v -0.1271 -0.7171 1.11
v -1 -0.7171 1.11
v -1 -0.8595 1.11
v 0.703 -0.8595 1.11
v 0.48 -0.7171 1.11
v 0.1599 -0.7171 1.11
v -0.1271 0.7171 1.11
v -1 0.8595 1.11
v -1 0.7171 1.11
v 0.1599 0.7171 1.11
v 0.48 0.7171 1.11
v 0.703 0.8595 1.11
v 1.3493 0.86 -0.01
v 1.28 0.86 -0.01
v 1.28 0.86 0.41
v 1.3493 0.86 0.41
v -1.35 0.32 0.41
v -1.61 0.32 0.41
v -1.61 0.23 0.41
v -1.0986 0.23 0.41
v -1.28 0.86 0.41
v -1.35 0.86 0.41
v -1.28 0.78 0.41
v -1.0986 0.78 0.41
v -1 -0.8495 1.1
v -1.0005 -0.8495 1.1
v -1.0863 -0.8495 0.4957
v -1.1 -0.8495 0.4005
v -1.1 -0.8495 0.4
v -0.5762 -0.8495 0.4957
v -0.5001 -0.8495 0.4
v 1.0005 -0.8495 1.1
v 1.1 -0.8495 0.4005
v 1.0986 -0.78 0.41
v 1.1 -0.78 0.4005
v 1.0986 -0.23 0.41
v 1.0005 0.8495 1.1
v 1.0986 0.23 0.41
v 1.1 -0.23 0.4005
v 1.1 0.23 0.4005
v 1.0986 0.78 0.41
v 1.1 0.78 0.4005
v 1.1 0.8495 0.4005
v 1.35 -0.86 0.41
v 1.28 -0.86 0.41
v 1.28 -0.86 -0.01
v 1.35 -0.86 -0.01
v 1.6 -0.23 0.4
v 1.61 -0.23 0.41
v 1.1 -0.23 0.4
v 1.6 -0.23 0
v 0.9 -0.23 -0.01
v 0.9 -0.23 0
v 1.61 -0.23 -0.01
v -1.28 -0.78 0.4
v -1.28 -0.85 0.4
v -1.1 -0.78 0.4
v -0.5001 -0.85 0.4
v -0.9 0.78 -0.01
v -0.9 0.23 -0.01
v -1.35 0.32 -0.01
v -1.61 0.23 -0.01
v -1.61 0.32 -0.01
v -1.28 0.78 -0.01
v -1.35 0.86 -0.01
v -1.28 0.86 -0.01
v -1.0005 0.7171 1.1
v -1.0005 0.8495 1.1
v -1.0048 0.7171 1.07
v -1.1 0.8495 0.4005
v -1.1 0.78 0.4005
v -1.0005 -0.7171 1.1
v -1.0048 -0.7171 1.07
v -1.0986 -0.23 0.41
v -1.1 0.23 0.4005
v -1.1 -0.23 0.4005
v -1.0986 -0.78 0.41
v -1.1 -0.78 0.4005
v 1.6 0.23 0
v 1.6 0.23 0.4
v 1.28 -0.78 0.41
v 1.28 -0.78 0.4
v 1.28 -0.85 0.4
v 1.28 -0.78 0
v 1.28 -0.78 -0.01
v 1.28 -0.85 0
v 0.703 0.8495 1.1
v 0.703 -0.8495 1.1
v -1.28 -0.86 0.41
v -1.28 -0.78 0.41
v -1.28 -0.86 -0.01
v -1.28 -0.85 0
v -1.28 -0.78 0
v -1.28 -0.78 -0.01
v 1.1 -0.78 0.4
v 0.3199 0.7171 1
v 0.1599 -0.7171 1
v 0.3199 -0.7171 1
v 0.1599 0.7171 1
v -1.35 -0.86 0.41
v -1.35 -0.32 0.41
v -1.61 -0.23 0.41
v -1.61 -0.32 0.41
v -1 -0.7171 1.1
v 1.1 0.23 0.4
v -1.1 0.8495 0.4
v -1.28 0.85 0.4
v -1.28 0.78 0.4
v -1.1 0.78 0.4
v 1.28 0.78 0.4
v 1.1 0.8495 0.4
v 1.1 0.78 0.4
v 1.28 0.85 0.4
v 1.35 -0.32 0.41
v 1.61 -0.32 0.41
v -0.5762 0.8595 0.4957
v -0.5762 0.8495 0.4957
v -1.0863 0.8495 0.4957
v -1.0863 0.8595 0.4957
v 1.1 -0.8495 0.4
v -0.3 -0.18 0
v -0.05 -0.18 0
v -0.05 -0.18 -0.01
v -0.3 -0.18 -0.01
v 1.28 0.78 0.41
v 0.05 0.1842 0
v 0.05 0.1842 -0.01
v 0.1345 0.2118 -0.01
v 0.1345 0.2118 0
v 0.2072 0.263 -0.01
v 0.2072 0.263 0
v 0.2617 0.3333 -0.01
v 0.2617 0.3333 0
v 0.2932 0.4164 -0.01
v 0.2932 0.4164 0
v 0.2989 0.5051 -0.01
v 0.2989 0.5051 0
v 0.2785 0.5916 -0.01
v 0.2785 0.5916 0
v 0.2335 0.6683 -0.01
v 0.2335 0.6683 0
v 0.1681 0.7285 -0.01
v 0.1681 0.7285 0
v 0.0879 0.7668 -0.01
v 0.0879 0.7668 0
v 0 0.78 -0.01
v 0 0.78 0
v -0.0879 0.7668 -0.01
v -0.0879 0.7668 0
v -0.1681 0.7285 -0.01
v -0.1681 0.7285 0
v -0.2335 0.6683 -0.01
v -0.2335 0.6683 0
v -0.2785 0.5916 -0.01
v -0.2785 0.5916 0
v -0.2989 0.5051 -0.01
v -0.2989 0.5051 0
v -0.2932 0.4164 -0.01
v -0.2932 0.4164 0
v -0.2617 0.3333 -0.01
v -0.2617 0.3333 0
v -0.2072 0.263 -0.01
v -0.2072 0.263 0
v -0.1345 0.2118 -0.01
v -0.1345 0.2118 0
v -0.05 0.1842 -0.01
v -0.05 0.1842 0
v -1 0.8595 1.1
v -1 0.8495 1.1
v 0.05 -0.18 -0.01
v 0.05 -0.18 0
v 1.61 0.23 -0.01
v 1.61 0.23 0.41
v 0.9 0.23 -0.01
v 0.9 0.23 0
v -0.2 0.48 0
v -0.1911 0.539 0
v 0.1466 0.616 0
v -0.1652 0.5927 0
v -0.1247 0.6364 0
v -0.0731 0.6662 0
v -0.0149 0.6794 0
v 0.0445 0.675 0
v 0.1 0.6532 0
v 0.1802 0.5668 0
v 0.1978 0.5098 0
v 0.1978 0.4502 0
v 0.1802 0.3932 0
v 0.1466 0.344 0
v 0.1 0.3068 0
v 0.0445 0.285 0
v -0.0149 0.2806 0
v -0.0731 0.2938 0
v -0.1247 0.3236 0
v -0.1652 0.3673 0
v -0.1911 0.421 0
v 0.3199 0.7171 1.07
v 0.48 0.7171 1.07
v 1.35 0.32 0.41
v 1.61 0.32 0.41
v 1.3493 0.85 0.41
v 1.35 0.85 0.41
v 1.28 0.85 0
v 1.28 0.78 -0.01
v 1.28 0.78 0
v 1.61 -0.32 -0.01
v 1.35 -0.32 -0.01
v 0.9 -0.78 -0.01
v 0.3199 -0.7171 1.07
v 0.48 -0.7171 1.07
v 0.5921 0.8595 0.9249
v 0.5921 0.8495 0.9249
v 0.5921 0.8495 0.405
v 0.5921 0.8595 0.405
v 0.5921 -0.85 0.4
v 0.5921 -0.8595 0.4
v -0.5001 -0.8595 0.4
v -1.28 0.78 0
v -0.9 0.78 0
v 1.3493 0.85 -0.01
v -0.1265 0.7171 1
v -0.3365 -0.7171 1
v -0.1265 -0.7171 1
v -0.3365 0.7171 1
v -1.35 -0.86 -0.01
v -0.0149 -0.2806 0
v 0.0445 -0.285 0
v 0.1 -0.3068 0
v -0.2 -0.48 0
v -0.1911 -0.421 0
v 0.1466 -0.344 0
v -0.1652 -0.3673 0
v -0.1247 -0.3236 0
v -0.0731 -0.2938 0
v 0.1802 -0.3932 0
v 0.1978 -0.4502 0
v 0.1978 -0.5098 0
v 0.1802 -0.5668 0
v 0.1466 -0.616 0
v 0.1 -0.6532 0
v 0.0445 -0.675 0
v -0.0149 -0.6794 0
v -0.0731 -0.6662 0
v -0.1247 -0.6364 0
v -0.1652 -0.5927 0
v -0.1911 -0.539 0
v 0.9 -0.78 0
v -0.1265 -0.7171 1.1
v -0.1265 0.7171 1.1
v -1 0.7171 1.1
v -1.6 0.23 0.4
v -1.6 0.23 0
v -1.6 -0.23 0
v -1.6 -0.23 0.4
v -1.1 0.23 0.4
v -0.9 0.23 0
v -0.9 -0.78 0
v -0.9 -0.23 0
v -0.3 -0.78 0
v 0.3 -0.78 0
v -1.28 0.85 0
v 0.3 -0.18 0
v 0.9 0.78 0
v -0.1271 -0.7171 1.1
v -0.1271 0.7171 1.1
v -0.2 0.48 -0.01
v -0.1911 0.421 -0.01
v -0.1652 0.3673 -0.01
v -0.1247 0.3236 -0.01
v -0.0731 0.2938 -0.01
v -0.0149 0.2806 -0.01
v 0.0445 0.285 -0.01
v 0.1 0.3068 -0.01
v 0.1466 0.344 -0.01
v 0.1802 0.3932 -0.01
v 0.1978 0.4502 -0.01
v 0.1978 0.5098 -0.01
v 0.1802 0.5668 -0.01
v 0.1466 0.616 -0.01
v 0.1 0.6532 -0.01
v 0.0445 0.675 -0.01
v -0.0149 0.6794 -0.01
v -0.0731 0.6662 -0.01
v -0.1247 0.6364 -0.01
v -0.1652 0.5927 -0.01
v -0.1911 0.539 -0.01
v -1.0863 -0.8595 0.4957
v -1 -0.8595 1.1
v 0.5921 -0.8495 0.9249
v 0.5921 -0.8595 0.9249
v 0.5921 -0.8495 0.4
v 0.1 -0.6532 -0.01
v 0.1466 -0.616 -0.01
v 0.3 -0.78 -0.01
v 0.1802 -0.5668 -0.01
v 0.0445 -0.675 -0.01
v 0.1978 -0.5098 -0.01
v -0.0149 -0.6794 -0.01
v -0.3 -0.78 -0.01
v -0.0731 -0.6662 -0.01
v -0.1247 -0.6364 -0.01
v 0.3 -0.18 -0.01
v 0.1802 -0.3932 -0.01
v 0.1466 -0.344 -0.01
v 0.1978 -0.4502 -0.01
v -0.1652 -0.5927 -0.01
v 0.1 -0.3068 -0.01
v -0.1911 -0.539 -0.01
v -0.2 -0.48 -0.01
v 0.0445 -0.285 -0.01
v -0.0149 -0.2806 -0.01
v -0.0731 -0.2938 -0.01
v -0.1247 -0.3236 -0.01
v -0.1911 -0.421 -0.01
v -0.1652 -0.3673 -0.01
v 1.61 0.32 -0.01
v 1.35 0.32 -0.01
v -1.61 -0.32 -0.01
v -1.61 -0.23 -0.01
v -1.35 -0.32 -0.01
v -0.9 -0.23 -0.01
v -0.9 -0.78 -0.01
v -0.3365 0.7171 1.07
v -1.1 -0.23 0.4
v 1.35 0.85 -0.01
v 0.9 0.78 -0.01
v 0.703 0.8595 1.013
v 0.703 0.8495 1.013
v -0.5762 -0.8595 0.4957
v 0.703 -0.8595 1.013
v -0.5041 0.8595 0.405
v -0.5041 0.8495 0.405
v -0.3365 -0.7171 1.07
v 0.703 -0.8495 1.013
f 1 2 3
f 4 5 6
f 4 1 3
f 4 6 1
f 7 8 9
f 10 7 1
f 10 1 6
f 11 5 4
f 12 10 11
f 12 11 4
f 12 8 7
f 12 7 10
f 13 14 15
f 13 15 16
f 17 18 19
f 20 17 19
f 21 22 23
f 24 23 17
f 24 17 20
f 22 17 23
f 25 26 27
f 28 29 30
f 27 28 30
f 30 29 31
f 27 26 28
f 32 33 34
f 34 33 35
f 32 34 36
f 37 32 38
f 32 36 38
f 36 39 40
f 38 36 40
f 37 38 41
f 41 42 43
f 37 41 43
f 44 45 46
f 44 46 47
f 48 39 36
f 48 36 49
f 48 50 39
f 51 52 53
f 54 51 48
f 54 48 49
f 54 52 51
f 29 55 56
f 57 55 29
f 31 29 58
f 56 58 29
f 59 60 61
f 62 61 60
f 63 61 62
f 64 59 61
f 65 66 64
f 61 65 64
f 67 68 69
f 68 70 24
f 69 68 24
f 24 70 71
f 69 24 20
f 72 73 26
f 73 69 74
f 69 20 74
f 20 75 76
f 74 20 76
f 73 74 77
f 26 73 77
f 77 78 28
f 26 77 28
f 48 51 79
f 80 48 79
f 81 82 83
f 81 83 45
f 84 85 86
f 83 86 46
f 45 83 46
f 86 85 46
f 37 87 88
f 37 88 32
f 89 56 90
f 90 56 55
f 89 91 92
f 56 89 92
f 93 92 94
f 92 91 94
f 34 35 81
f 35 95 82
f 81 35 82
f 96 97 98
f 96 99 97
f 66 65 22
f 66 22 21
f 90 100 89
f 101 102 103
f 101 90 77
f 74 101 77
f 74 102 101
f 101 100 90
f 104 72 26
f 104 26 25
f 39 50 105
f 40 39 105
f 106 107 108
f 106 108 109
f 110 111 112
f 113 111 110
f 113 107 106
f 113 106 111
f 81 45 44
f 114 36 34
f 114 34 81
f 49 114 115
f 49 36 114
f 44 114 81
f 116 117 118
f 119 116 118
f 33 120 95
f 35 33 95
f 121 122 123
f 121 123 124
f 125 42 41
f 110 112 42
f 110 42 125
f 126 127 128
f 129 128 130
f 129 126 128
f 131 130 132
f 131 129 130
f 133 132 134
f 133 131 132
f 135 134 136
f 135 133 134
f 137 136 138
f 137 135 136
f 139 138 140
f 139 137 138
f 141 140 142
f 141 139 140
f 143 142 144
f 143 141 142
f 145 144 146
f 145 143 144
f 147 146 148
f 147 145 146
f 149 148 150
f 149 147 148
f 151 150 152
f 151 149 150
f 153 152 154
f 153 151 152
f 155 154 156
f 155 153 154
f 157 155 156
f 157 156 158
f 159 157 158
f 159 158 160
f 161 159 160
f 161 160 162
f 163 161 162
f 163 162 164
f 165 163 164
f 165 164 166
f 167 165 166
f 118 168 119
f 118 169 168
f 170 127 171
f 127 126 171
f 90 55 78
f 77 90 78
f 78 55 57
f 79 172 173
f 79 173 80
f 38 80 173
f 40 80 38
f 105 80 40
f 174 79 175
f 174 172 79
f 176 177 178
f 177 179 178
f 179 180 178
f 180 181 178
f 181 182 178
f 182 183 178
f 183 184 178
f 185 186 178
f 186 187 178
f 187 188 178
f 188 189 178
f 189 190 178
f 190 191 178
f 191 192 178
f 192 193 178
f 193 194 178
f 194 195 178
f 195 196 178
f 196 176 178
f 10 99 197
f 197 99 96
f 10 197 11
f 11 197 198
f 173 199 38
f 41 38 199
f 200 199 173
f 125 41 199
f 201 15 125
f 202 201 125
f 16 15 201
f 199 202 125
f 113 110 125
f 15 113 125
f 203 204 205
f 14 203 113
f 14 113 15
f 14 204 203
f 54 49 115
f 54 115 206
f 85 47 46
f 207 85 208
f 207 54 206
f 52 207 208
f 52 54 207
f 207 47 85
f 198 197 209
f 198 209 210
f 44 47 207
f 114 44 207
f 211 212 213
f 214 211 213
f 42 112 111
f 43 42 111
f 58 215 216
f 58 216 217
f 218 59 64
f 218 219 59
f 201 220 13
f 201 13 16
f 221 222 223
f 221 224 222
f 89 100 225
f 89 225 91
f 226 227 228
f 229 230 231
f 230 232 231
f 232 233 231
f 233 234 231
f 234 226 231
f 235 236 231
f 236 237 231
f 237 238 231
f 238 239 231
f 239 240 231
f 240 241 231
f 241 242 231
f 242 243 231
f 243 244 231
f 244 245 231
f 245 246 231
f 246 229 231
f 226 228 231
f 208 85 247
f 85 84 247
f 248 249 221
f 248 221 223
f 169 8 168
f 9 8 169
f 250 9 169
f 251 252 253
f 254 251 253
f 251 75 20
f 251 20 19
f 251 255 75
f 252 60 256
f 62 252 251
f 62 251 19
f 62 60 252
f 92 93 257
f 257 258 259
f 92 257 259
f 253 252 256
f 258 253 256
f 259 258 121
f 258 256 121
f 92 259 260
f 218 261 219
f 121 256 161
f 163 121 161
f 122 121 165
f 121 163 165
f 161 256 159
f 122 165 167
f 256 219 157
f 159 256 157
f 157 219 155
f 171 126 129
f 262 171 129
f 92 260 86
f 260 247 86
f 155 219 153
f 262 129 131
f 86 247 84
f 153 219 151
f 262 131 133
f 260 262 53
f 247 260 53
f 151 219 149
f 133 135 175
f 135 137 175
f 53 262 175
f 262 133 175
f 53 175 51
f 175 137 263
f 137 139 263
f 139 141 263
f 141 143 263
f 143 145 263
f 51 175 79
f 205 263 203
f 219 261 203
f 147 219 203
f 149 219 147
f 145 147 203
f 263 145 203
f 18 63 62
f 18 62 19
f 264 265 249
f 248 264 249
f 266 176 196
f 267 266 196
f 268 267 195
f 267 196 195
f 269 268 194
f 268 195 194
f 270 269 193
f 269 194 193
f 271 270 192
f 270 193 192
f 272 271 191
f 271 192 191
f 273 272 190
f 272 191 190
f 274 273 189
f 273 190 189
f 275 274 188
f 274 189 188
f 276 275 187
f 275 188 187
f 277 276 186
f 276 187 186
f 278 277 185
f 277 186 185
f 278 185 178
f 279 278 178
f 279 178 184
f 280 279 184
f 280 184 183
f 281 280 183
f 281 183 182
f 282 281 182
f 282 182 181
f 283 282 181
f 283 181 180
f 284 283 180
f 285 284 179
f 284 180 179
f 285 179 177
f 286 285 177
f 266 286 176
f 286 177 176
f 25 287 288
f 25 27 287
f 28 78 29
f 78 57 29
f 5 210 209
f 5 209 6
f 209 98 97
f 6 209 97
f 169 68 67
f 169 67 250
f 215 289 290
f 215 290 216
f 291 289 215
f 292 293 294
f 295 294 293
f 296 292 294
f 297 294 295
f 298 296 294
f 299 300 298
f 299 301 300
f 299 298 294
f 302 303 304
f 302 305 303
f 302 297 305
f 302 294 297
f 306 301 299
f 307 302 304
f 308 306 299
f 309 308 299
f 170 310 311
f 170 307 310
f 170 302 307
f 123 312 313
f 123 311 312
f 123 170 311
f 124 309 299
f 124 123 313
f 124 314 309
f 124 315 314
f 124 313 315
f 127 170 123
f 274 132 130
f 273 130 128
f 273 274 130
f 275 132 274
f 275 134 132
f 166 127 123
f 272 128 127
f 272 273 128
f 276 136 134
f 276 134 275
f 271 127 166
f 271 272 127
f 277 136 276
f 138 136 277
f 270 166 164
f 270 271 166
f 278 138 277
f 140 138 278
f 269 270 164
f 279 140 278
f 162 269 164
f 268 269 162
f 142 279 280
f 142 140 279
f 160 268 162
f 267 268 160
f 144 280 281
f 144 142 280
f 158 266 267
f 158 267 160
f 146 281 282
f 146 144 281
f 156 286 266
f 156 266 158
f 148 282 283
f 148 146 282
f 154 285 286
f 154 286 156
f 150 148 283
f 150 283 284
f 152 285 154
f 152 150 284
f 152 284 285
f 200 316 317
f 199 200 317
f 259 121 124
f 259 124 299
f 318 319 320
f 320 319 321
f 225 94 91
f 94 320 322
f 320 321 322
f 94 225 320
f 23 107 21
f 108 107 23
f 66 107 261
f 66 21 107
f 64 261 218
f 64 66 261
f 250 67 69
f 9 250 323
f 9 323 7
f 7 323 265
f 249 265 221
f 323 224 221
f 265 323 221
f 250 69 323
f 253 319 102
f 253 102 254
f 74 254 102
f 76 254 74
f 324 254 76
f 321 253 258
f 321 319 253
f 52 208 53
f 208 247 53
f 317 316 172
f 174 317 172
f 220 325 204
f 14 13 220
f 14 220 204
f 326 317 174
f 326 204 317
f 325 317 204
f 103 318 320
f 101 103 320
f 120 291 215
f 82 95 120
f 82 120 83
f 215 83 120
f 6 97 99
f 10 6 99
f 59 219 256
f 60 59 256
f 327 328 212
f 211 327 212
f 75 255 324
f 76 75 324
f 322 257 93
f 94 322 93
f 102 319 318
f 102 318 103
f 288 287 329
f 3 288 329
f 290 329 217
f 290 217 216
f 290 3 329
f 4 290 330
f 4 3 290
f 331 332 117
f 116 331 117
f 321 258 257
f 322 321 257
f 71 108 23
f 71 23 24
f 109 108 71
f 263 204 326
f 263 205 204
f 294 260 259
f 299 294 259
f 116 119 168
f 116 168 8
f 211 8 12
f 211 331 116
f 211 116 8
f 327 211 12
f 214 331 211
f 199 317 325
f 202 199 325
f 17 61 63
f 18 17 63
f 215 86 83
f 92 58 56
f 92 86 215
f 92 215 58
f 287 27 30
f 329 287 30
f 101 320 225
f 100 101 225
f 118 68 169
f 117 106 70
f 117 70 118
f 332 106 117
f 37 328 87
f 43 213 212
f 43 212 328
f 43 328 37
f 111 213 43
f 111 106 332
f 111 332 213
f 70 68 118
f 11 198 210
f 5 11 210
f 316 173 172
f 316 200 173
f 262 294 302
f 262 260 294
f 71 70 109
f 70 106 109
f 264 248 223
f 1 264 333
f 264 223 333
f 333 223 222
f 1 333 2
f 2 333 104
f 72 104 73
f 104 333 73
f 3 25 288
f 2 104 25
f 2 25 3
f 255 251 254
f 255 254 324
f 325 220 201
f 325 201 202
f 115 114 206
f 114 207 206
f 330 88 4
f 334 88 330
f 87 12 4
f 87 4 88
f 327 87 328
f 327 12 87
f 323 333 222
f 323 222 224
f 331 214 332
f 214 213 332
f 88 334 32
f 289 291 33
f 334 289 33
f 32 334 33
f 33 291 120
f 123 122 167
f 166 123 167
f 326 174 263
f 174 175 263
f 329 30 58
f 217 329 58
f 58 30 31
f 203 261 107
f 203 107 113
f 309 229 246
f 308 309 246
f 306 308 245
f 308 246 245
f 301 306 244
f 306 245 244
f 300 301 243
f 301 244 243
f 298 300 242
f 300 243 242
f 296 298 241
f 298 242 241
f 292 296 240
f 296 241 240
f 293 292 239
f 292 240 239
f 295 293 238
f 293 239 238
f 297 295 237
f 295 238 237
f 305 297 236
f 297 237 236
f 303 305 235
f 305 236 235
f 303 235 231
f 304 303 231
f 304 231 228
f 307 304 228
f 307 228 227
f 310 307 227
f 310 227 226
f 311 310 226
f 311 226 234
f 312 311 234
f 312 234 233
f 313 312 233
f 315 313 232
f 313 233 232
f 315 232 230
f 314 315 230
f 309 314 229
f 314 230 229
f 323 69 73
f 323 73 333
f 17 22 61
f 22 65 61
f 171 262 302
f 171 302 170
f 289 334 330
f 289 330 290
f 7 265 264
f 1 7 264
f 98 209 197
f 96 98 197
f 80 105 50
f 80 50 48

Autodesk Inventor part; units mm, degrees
ref_plane "YZ Plane" through (0, 0, 0) normal (1, 0, 0) x (0, 1, 0)
ref_plane "XZ Plane" through (0, 0, 0) normal (0, 1, 0) x (-1, 0, 0)
ref_plane "XY Plane" through (0, 0, 0) normal (0, 0, 1) x (1, 0, 0)
sketch "Sketch1" plane through (0, 0, 0) normal (0, 0, 1) x (1, 0, 0)
  line L0 (1.35, -0.85) -> (-1.35, -0.85)
  line L1 (-1.35, -0.85) -> (-1.35, 0.85)
  line L2 (-1.35, 0.85) -> (1.35, 0.85)
  line L3 (1.35, 0.85) -> (1.35, -0.85)
  line L4 (1.35, -0.85) -> (-1.35, 0.85) construction
  line L5 (-1.35, -0.85) -> (1.35, 0.85) construction
  line L6 (-1.35, 0) -> (1.35, 0) construction
  line L7 (0, 0.85) -> (0, -0.85) construction
  line L8 (1.6, -0.32) -> (1.35, -0.32)
  line L9 (1.35, -0.32) -> (1.35, 0.32)
  line L10 (1.35, 0.32) -> (1.6, 0.32)
  line L11 (1.6, 0.32) -> (1.6, -0.32)
  line L12 (1.6, -0.32) -> (1.35, 0.32) construction
  line L13 (1.35, -0.32) -> (1.6, 0.32) construction
  line L14 (-1.6, -0.32) -> (-1.35, -0.32)
  line L15 (-1.35, -0.32) -> (-1.35, 0.32)
  line L16 (-1.35, 0.32) -> (-1.6, 0.32)
  line L17 (-1.6, 0.32) -> (-1.6, -0.32)
  line L18 (-1.6, -0.32) -> (-1.35, 0.32) construction
  line L19 (-1.35, -0.32) -> (-1.6, 0.32) construction
  point P0 (0, 0)
  point P1 (1.475, 0)
  point P2 (-1.475, 0)
  dimension "d0" = 2.7
  dimension "d1" = 1.7
  dimension "d3" = 0.64
  dimension "d4" = 3.2
extrude "Extrusion1" add sketch "Sketch1" along normal blind 0.4
sketch "Sketch2" plane through (0, 0, 0.4) normal (0, 0, 1) x (1, 0, 0)
  line L0 (-1.1, -0.8495) -> (1.1, -0.8495)
  line L1 (1.1, -0.8495) -> (1.1, 0.8495)
  line L2 (1.1, 0.8495) -> (-1.1, 0.8495)
  line L3 (-1.1, 0.8495) -> (-1.1, -0.8495)
  line L4 (-1.1, -0.8495) -> (1.1, 0.8495) construction
  line L5 (1.1, -0.8495) -> (-1.1, 0.8495) construction
  point P0 (0, 0)
  dimension "d7" = 2.2
  dimension "d27" = 1.699
sketch "Sketch3" plane through (0, 0, 0) normal (0, 0, -1) x (-1, 0, 0)
  line L0 (1.35, -0.85) -> (-1.35, -0.85) projected
  line L1 (-0.9, 0.85) -> (0.9, 0.85)
  line L2 (0.9, 0.85) -> (0.9, -0.85)
  line L3 (0.9, -0.85) -> (-0.9, -0.85)
  line L4 (-0.9, -0.85) -> (-0.9, 0.85)
  line L5 (-0.9, 0.85) -> (0.9, -0.85) construction
  line L6 (0.9, 0.85) -> (-0.9, -0.85) construction
  line L7 (1.28, 0.85) -> (-1.28, 0.85)
  line L8 (-1.28, 0.85) -> (-1.28, 0.78)
  line L9 (-1.28, 0.78) -> (1.28, 0.78)
  line L10 (1.28, 0.78) -> (1.28, 0.85)
  line L11 (1.28, 0.85) -> (-1.28, 0.78) construction
  line L12 (-1.28, 0.85) -> (1.28, 0.78) construction
  line L13 (-1.35, 0.85) -> (-1.35, 0.32) projected
  line L14 (-1.6, -0.32) -> (-1.6, 0.32) projected
  line L15 (1.6, 0.23) -> (-1.6, 0.23)
  line L16 (-1.6, 0.23) -> (-1.6, -0.23)
  line L17 (-1.6, -0.23) -> (1.6, -0.23)
  line L18 (1.6, -0.23) -> (1.6, 0.23)
  line L19 (1.6, 0.23) -> (-1.6, -0.23) construction
  line L20 (-1.6, 0.23) -> (1.6, -0.23) construction
  line L21 (1.35, -0.85) -> (1.35, -0.32)
  line L22 (1.35, -0.32) -> (1.6, -0.32)
  line L23 (1.6, -0.32) -> (1.35, -0.32) projected
  line L24 (1.6, -0.32) -> (1.6, 0.32)
  line L25 (1.6, 0.32) -> (1.35, 0.32)
  line L26 (1.35, 0.32) -> (1.35, 0.85)
  line L27 (-1.35, 0.85) -> (1.35, 0.85) projected
  line L28 (1.35, 0.85) -> (-1.35, 0.85)
  line L29 (-1.35, 0.85) -> (-1.35, 0.32)
  line L30 (-1.35, 0.32) -> (-1.6, 0.32)
  line L31 (-1.6, 0.32) -> (-1.35, 0.32) projected
  line L32 (-1.6, -0.32) -> (-1.35, -0.32)
  line L33 (-1.35, -0.32) -> (-1.6, -0.32) projected
  line L34 (-1.35, -0.32) -> (-1.35, -0.85)
  line L35 (1.6, 0) -> (-1.6, 0) construction
  line L36 (-0.9, -0.85) -> (0.9, -0.85)
  line L37 (-0.9, -0.85) -> (0.9, 0.85) construction
  line L38 (0.9, -0.85) -> (-0.9, 0.85) construction
  line L39 (1.28, -0.85) -> (-1.28, -0.85)
  line L40 (-1.28, -0.85) -> (-1.28, -0.78)
  line L41 (-1.28, -0.78) -> (1.28, -0.78)
  line L42 (1.28, -0.78) -> (1.28, -0.85)
  line L43 (1.28, -0.85) -> (-1.28, -0.78) construction
  line L44 (-1.28, -0.85) -> (1.28, -0.78) construction
  line L45 (1.35, -0.85) -> (-1.35, -0.85)
  line L46 (-0.3, -0.18) -> (0.3, -0.18)
  line L47 (0.3, -0.18) -> (0.3, -0.78)
  line L48 (0.3, -0.78) -> (-0.3, -0.78)
  line L49 (-0.3, -0.78) -> (-0.3, -0.18)
  line L50 (-0.3, -0.18) -> (0.3, -0.78) construction
  line L51 (0.3, -0.18) -> (-0.3, -0.78) construction
  circle A0 centre (0, 0.48) radius 0.3
  circle A1 centre (0, 0.48) radius 0.2
  line L52 (0.05, -0.18) -> (0.05, 0.1842)
  line L53 (-0.05, 0.1842) -> (-0.05, -0.18)
  line L54 (0, -0.85) -> (0, 0.85) construction
  circle A2 centre (0, -0.48) radius 0.2
  point P0 (0, 0)
  point P1 (0, 0.815)
  point P2 (0, 0.815)
  point P3 (0, 0)
  point P4 (0, -0.815)
  point P5 (0, -0.815)
  point P6 (0, -0.48)
  point P7 (0, -0.48)
  point P8 (0, 0)
  point P9 (0, -0.48)
  point P10 (0, 0)
  dimension "d8" = 1.8
  dimension "d9" = 0.07
  dimension "d10" = 0.07
  dimension "d11" = 0.46
  dimension "d14" = 0.6
  dimension "d15" = 0.6
  dimension "d16" = 0.4
  dimension "d17" = 0.1
  dimension "d18" = 0.4
extrude "Extrusion2" add sketch "Sketch3" along normal blind 0.01 contours L0 L42 L41 L2 L17 L24 L22 L21 | L0 L34 L32 L14 L17 L4 L41 L40 | L41 L49 L17 L47 | L15 L2 L9 L10 L27 L26 L25 L24 | L17 L49 L46 L47 | L15 L14 L30 L13 L27 L8 L9 L4 | A0 L15 | L15 A0 | L52 L46 L53 A0
extrude "Extrusion3" add sketch "Sketch2" along normal blind 0.7
chamfer "Chamfer1" distance 0.1 distance2 0.7 1 edges at (-1.1, 0, 1.1) measured on face at (-0.3667, 0.2832, 1.1)
chamfer "Chamfer2" distance 0.1 distance2 0.7 1 edges at (1.1, 0, 1.1) measured on face at (-0.3003, 0.2832, 1.1)
sketch "Sketch5" plane through (0, 0, 0.4) normal (0, 0, 1) x (1, 0, 0)
  line L0 (-0.9, 0.85) -> (0.9, 0.85)
  line L1 (0.9, 0.85) -> (0.9, -0.85)
  line L2 (0.9, -0.85) -> (-0.9, -0.85)
  line L3 (-0.9, -0.85) -> (-0.9, 0.85)
  line L4 (-0.9, 0.85) -> (0.9, -0.85) construction
  line L5 (0.9, 0.85) -> (-0.9, -0.85) construction
  line L6 (1.28, 0.85) -> (-1.28, 0.85)
  line L7 (-1.28, 0.85) -> (-1.28, 0.78)
  line L8 (-1.28, 0.78) -> (1.28, 0.78)
  line L9 (1.28, 0.78) -> (1.28, 0.85)
  line L10 (1.28, 0.85) -> (-1.28, 0.78) construction
  line L11 (-1.28, 0.85) -> (1.28, 0.78) construction
  line L12 (1.6, 0.23) -> (-1.6, 0.23)
  line L13 (-1.6, 0.23) -> (-1.6, -0.23)
  line L14 (-1.6, -0.23) -> (1.6, -0.23)
  line L15 (1.6, -0.23) -> (1.6, 0.23)
  line L16 (1.6, 0.23) -> (-1.6, -0.23) construction
  line L17 (-1.6, 0.23) -> (1.6, -0.23) construction
  line L18 (1.35, -0.85) -> (1.35, -0.32)
  line L19 (1.35, -0.32) -> (1.6, -0.32)
  line L20 (1.6, -0.32) -> (1.6, 0.32)
  line L21 (1.6, 0.32) -> (1.35, 0.32)
  line L22 (1.35, 0.32) -> (1.35, 0.85)
  line L23 (1.35, 0.85) -> (-1.35, 0.85)
  line L24 (-1.35, 0.85) -> (-1.35, 0.32)
  line L25 (-1.35, 0.32) -> (-1.6, 0.32)
  line L26 (-1.6, -0.32) -> (-1.35, -0.32)
  line L27 (-1.35, -0.32) -> (-1.35, -0.85)
  line L28 (1.6, 0) -> (-1.6, 0) construction
  line L29 (-1.28, -0.85) -> (-1.28, -0.78)
  line L30 (-0.9, -0.85) -> (0.9, -0.85)
  line L31 (-0.9, -0.85) -> (0.9, 0.85) construction
  line L32 (0.9, -0.85) -> (-0.9, 0.85) construction
  line L33 (1.35, -0.85) -> (-1.35, -0.85)
  line L34 (1.28, -0.85) -> (-1.28, -0.85)
  line L35 (-1.28, -0.78) -> (1.28, -0.78)
  line L36 (1.28, -0.85) -> (-1.28, -0.78) construction
  line L37 (-1.28, -0.85) -> (1.28, -0.78) construction
  line L38 (1.28, -0.78) -> (1.28, -0.85)
  line L39 (-0.3, -0.18) -> (0.3, -0.18)
  line L40 (0.3, -0.18) -> (0.3, -0.78)
  line L41 (0.3, -0.78) -> (-0.3, -0.78)
  line L42 (-0.3, -0.78) -> (-0.3, -0.18)
  line L43 (-0.3, -0.18) -> (0.3, -0.78) construction
  line L44 (0.3, -0.18) -> (-0.3, -0.78) construction
  circle A0 centre (0, 0.48) radius 0.3
  circle A1 centre (0, 0.48) radius 0.2
  line L45 (0.05, -0.18) -> (0.05, 0.1842)
  line L46 (-0.05, 0.1842) -> (-0.05, -0.18)
  line L47 (0, -0.85) -> (0, 0.85) construction
  circle A2 centre (0, -0.48) radius 0.2
  line L48 (-1.6, 0.32) -> (-1.6, -0.32)
  line L49 (-1.35, 0.32) -> (-1.6, 0.32) projected
  point P0 (0, 0)
  point P1 (0, 0.815)
  point P2 (0, 0.815)
  point P3 (0, 0)
  point P4 (0, -0.815)
  point P5 (0, -0.815)
  point P6 (0, -0.48)
  point P7 (0, -0.48)
  point P8 (0, 0)
  point P9 (0, -0.48)
  point P10 (0, 0)
  dimension "d30" = 1.8
  dimension "d31" = 0.07
  dimension "d33" = 0.46
  dimension "d34" = 0.6
  dimension "d35" = 0.6
  dimension "d36" = 0.4
  dimension "d37" = 0.1
  dimension "d38" = 0.4
extrude "Extrusion5" add sketch "Sketch5" along normal blind 0.01 contours L3 L12 L48 L25 L24 L23 L7 L8 | L8 L9 L23 L22 L21 L20 L12 L1 | L3 L35 L29 L33 L27 L26 L48 L14 | L14 L20 L19 L18 L33 L38 L35 L1
sketch "Sketch6" plane through (-1.28, 0.85, 0) normal (0, 1, 0) x (1, 0, 0)
  line L0 (0, 0.01) -> (-0.07, 0.01)
  line L1 (-0.07, 0.01) -> (-0.07, -0.41)
  line L2 (-0.07, -0.41) -> (0, -0.41)
  line L3 (0, -0.41) -> (0, 0.01)
  line L4 (2.3786, -0.41) -> (2.88, -0.41) projected
  line L5 (2.56, 0.01) -> (2.6293, 0.01)
  line L6 (2.6293, 0.01) -> (2.6293, -0.41)
  line L7 (2.6293, -0.41) -> (2.56, -0.41)
  line L8 (2.56, -0.41) -> (2.56, 0.01)
  point P0 (1.28, 0)
extrude "Extrusion6" add sketch "Sketch6" along normal blind 0.01
sketch "Sketch7" plane through (-1.28, -0.85, 0) normal (0, -1, 0) x (1, 0, 0)
  line L0 (0, -0.01) -> (-0.07, -0.01)
  line L1 (-0.07, -0.01) -> (-0.07, 0.41)
  line L2 (-0.07, 0.41) -> (0, 0.41)
  line L3 (0, 0.41) -> (0, -0.01)
  line L4 (2.63, -0.01) -> (2.56, -0.01)
  line L5 (2.56, -0.01) -> (2.56, 0.41)
  line L6 (2.56, 0.41) -> (2.63, 0.41)
  line L7 (2.63, 0.41) -> (2.63, -0.01)
  point P0 (1.28, 0)
extrude "Extrusion7" add sketch "Sketch7" along normal blind 0.01
sketch "Sketch8" plane through (1.6, -0.23, 0) normal (1, 0, 0) x (0, 0, -1)
  line L0 (-0.41, -0.09) -> (0.01, -0.09)
  line L1 (0.01, -0.09) -> (0.01, 0)
  line L2 (0.01, 0) -> (-0.41, 0)
  line L3 (-0.41, 0) -> (-0.41, -0.09)
  line L4 (0.01, 0.55) -> (-0.41, 0.55)
  line L5 (-0.41, 0.55) -> (-0.41, 0.46)
  line L6 (-0.41, 0.46) -> (0.01, 0.46)
  line L7 (0.01, 0.46) -> (0.01, 0.55)
  point P0 (0, 0.23)
extrude "Extrusion8" add sketch "Sketch8" along normal blind 0.01
sketch "Sketch9" plane through (-1.6, -0.23, 0) normal (-1, 0, 0) x (0, 0, 1)
  line L0 (-0.01, -0.09) -> (0.41, -0.09)
  line L1 (0.41, -0.09) -> (0.41, 0)
  line L2 (0.41, 0) -> (-0.01, 0)
  line L3 (-0.01, 0) -> (-0.01, -0.09)
  line L4 (0.41, 0.46) -> (-0.01, 0.46)
  line L5 (-0.01, 0.46) -> (-0.01, 0.55)
  line L6 (-0.01, 0.55) -> (0.41, 0.55)
  line L7 (0.41, 0.55) -> (0.41, 0.46)
  point P0 (0, 0.23)
extrude "Extrusion9" add sketch "Sketch9" along normal blind 0.01
sketch "Sketch10" plane through (0, 0, 1.1) normal (0, 0, 1) x (1, 0, 0)
  line L0 (0.48, 0.7171) -> (0.1599, 0.7171)
  line L1 (0.1599, 0.7171) -> (0.1599, -0.7171)
  line L2 (0.1599, -0.7171) -> (0.48, -0.7171)
  line L3 (0.48, -0.7171) -> (0.48, 0.7171)
  line L4 (0.48, 0.7171) -> (0.1599, -0.7171) construction
  line L5 (0.1599, 0.7171) -> (0.48, -0.7171) construction
  line L6 (-1.0459, 0.7171) -> (-0.1265, 0.7171)
  line L7 (-0.1265, 0.7171) -> (-0.1265, -0.7171)
  line L8 (-0.1265, -0.7171) -> (-1.0459, -0.7171)
  line L9 (-1.0459, -0.7171) -> (-1.0459, 0.7171)
  line L10 (-1.0459, 0.7171) -> (-0.1265, -0.7171) construction
  line L11 (-0.1265, 0.7171) -> (-1.0459, -0.7171) construction
  line L12 (0.1599, -0.7171) -> (0.3199, -0.7171)
  line L13 (0.3199, -0.7171) -> (0.3199, 0.7171)
  line L14 (0.3199, 0.7171) -> (0.1599, 0.7171)
  line L15 (0.1599, 0.7171) -> (0.1599, -0.7171)
  line L16 (-0.1265, -0.7171) -> (-0.3365, -0.7171)
  line L17 (-0.3365, -0.7171) -> (-0.3365, 0.7171)
  line L18 (-0.3365, 0.7171) -> (-0.1265, 0.7171)
  line L19 (-0.1265, 0.7171) -> (-0.1265, -0.7171)
  line L20 (-1, -0.8495) -> (-1, 0.8495) projected
  point P0 (0, 0)
  point P1 (0.3199, 0)
  point P2 (-0.5862, 0)
  point P3 (-0.5862, 0)
  point P4 (0.3199, 0)
  point P5 (-0.5862, 0)
extrude "Extrusion10" cut sketch "Sketch10" against normal blind 0.1 contours L13 L2 L1 L0 | L6 L7 L8 L17
extrude "Extrusion11" cut sketch "Sketch10" against normal blind 0.03 contours L3 L2 L13 L0 | L17 L8 L20 L6 | L20 L8 L9 L6
sketch "Sketch11" plane through (0, 0, 1.1) normal (0, 0, 1) x (1, 0, 0)
  line L0 (-1, -0.8495) -> (1, -0.8495) projected
  line L1 (0.703, -0.8495) -> (-1, -0.8495)
  line L2 (-1, -0.8495) -> (-1, 0.8495)
  line L3 (-1, 0.8495) -> (0.703, 0.8495)
  line L4 (0.703, 0.8495) -> (0.703, -0.8495)
  line L5 (0.48, -0.7171) -> (0.1599, -0.7171)
  line L6 (0.1599, -0.7171) -> (0.1599, 0.7171)
  line L7 (0.1599, 0.7171) -> (0.48, 0.7171)
  line L8 (0.48, 0.7171) -> (0.48, -0.7171)
  line L9 (-0.1271, -0.7171) -> (-1, -0.7171)
  line L10 (-1, -0.7171) -> (-1, 0.7171)
  line L11 (-1, 0.7171) -> (-0.1271, 0.7171)
  line L12 (-0.1271, 0.7171) -> (-0.1271, -0.7171)
  point P0 (0, 0)
extrude "Extrusion12" add sketch "Sketch11" along normal blind 0.01 contours L2 L9 L12 L11 L3 L4 L0
sketch "Sketch12" plane through (-1.1, 0.8495, 0.4) normal (0, 1, 0) x (1, 0, 0)
  line L0 (1.803, -0.7) -> (1.803, -0.613)
  line L1 (1.803, -0.613) -> (1.6921, -0.5249)
  line L2 (1.6921, -0.5249) -> (1.6921, -0.005)
  line L3 (1.6921, -0.005) -> (0.5959, -0.005)
  line L4 (0.5959, -0.005) -> (0.5238, -0.0957)
  line L5 (0.5238, -0.0957) -> (0.0137, -0.0957)
  line L6 (0.1, -0.7) -> (0, 0) projected
  line L7 (1.803, -0.71) -> (1.803, -0.7)
  line L8 (1.803, -0.7) -> (1.803, -0.71) projected
  line L9 (0.1, -0.71) -> (0.1, -0.7)
  line L10 (0.1, -0.7) -> (0.0137, -0.0957)
  line L11 (0, 0) -> (0.1, -0.7) projected
  line L12 (1.803, -0.71) -> (0.1, -0.71)
  line L13 (0.1, -0.71) -> (1.803, -0.71) projected
  point P0 (1.1, 0.4)
extrude "Extrusion13" add sketch "Sketch12" along normal blind 0.01
sketch "Sketch13" plane through (-1.1, -0.8495, 0.4) normal (0, -1, 0) x (1, 0, 0)
  line L0 (0.0137, 0.0957) -> (0.1, 0.7)
  line L1 (0.0137, 0.0957) -> (0.1, 0.7) projected
  line L2 (0.1, 0.7) -> (0.1, 0.71)
  line L3 (0.1, 0.71) -> (0.9729, 0.71) projected
  line L4 (0.1, 0.71) -> (1.803, 0.71)
  line L5 (2.1, 0.7) -> (1.803, 0.7) projected
  line L6 (1.803, 0.71) -> (1.803, 0.7)
  line L7 (1.803, 0.7) -> (1.803, 0.613)
  line L8 (1.803, 0.613) -> (1.6921, 0.5249)
  line L9 (1.6921, 0.5249) -> (1.803, 0.613) projected
  line L10 (1.6921, 0.5249) -> (1.6921, 0)
  line L11 (2.2, 0) -> (0, 0) projected
  line L12 (0.0137, 0.0957) -> (0.5238, 0.0957)
  line L13 (0.5238, 0.0957) -> (0.5999, 0)
  line L14 (1.6921, 0) -> (0.5999, 0)
extrude "Extrusion14" add sketch "Sketch13" along normal blind 0.01
properties part number "GP2S60"
